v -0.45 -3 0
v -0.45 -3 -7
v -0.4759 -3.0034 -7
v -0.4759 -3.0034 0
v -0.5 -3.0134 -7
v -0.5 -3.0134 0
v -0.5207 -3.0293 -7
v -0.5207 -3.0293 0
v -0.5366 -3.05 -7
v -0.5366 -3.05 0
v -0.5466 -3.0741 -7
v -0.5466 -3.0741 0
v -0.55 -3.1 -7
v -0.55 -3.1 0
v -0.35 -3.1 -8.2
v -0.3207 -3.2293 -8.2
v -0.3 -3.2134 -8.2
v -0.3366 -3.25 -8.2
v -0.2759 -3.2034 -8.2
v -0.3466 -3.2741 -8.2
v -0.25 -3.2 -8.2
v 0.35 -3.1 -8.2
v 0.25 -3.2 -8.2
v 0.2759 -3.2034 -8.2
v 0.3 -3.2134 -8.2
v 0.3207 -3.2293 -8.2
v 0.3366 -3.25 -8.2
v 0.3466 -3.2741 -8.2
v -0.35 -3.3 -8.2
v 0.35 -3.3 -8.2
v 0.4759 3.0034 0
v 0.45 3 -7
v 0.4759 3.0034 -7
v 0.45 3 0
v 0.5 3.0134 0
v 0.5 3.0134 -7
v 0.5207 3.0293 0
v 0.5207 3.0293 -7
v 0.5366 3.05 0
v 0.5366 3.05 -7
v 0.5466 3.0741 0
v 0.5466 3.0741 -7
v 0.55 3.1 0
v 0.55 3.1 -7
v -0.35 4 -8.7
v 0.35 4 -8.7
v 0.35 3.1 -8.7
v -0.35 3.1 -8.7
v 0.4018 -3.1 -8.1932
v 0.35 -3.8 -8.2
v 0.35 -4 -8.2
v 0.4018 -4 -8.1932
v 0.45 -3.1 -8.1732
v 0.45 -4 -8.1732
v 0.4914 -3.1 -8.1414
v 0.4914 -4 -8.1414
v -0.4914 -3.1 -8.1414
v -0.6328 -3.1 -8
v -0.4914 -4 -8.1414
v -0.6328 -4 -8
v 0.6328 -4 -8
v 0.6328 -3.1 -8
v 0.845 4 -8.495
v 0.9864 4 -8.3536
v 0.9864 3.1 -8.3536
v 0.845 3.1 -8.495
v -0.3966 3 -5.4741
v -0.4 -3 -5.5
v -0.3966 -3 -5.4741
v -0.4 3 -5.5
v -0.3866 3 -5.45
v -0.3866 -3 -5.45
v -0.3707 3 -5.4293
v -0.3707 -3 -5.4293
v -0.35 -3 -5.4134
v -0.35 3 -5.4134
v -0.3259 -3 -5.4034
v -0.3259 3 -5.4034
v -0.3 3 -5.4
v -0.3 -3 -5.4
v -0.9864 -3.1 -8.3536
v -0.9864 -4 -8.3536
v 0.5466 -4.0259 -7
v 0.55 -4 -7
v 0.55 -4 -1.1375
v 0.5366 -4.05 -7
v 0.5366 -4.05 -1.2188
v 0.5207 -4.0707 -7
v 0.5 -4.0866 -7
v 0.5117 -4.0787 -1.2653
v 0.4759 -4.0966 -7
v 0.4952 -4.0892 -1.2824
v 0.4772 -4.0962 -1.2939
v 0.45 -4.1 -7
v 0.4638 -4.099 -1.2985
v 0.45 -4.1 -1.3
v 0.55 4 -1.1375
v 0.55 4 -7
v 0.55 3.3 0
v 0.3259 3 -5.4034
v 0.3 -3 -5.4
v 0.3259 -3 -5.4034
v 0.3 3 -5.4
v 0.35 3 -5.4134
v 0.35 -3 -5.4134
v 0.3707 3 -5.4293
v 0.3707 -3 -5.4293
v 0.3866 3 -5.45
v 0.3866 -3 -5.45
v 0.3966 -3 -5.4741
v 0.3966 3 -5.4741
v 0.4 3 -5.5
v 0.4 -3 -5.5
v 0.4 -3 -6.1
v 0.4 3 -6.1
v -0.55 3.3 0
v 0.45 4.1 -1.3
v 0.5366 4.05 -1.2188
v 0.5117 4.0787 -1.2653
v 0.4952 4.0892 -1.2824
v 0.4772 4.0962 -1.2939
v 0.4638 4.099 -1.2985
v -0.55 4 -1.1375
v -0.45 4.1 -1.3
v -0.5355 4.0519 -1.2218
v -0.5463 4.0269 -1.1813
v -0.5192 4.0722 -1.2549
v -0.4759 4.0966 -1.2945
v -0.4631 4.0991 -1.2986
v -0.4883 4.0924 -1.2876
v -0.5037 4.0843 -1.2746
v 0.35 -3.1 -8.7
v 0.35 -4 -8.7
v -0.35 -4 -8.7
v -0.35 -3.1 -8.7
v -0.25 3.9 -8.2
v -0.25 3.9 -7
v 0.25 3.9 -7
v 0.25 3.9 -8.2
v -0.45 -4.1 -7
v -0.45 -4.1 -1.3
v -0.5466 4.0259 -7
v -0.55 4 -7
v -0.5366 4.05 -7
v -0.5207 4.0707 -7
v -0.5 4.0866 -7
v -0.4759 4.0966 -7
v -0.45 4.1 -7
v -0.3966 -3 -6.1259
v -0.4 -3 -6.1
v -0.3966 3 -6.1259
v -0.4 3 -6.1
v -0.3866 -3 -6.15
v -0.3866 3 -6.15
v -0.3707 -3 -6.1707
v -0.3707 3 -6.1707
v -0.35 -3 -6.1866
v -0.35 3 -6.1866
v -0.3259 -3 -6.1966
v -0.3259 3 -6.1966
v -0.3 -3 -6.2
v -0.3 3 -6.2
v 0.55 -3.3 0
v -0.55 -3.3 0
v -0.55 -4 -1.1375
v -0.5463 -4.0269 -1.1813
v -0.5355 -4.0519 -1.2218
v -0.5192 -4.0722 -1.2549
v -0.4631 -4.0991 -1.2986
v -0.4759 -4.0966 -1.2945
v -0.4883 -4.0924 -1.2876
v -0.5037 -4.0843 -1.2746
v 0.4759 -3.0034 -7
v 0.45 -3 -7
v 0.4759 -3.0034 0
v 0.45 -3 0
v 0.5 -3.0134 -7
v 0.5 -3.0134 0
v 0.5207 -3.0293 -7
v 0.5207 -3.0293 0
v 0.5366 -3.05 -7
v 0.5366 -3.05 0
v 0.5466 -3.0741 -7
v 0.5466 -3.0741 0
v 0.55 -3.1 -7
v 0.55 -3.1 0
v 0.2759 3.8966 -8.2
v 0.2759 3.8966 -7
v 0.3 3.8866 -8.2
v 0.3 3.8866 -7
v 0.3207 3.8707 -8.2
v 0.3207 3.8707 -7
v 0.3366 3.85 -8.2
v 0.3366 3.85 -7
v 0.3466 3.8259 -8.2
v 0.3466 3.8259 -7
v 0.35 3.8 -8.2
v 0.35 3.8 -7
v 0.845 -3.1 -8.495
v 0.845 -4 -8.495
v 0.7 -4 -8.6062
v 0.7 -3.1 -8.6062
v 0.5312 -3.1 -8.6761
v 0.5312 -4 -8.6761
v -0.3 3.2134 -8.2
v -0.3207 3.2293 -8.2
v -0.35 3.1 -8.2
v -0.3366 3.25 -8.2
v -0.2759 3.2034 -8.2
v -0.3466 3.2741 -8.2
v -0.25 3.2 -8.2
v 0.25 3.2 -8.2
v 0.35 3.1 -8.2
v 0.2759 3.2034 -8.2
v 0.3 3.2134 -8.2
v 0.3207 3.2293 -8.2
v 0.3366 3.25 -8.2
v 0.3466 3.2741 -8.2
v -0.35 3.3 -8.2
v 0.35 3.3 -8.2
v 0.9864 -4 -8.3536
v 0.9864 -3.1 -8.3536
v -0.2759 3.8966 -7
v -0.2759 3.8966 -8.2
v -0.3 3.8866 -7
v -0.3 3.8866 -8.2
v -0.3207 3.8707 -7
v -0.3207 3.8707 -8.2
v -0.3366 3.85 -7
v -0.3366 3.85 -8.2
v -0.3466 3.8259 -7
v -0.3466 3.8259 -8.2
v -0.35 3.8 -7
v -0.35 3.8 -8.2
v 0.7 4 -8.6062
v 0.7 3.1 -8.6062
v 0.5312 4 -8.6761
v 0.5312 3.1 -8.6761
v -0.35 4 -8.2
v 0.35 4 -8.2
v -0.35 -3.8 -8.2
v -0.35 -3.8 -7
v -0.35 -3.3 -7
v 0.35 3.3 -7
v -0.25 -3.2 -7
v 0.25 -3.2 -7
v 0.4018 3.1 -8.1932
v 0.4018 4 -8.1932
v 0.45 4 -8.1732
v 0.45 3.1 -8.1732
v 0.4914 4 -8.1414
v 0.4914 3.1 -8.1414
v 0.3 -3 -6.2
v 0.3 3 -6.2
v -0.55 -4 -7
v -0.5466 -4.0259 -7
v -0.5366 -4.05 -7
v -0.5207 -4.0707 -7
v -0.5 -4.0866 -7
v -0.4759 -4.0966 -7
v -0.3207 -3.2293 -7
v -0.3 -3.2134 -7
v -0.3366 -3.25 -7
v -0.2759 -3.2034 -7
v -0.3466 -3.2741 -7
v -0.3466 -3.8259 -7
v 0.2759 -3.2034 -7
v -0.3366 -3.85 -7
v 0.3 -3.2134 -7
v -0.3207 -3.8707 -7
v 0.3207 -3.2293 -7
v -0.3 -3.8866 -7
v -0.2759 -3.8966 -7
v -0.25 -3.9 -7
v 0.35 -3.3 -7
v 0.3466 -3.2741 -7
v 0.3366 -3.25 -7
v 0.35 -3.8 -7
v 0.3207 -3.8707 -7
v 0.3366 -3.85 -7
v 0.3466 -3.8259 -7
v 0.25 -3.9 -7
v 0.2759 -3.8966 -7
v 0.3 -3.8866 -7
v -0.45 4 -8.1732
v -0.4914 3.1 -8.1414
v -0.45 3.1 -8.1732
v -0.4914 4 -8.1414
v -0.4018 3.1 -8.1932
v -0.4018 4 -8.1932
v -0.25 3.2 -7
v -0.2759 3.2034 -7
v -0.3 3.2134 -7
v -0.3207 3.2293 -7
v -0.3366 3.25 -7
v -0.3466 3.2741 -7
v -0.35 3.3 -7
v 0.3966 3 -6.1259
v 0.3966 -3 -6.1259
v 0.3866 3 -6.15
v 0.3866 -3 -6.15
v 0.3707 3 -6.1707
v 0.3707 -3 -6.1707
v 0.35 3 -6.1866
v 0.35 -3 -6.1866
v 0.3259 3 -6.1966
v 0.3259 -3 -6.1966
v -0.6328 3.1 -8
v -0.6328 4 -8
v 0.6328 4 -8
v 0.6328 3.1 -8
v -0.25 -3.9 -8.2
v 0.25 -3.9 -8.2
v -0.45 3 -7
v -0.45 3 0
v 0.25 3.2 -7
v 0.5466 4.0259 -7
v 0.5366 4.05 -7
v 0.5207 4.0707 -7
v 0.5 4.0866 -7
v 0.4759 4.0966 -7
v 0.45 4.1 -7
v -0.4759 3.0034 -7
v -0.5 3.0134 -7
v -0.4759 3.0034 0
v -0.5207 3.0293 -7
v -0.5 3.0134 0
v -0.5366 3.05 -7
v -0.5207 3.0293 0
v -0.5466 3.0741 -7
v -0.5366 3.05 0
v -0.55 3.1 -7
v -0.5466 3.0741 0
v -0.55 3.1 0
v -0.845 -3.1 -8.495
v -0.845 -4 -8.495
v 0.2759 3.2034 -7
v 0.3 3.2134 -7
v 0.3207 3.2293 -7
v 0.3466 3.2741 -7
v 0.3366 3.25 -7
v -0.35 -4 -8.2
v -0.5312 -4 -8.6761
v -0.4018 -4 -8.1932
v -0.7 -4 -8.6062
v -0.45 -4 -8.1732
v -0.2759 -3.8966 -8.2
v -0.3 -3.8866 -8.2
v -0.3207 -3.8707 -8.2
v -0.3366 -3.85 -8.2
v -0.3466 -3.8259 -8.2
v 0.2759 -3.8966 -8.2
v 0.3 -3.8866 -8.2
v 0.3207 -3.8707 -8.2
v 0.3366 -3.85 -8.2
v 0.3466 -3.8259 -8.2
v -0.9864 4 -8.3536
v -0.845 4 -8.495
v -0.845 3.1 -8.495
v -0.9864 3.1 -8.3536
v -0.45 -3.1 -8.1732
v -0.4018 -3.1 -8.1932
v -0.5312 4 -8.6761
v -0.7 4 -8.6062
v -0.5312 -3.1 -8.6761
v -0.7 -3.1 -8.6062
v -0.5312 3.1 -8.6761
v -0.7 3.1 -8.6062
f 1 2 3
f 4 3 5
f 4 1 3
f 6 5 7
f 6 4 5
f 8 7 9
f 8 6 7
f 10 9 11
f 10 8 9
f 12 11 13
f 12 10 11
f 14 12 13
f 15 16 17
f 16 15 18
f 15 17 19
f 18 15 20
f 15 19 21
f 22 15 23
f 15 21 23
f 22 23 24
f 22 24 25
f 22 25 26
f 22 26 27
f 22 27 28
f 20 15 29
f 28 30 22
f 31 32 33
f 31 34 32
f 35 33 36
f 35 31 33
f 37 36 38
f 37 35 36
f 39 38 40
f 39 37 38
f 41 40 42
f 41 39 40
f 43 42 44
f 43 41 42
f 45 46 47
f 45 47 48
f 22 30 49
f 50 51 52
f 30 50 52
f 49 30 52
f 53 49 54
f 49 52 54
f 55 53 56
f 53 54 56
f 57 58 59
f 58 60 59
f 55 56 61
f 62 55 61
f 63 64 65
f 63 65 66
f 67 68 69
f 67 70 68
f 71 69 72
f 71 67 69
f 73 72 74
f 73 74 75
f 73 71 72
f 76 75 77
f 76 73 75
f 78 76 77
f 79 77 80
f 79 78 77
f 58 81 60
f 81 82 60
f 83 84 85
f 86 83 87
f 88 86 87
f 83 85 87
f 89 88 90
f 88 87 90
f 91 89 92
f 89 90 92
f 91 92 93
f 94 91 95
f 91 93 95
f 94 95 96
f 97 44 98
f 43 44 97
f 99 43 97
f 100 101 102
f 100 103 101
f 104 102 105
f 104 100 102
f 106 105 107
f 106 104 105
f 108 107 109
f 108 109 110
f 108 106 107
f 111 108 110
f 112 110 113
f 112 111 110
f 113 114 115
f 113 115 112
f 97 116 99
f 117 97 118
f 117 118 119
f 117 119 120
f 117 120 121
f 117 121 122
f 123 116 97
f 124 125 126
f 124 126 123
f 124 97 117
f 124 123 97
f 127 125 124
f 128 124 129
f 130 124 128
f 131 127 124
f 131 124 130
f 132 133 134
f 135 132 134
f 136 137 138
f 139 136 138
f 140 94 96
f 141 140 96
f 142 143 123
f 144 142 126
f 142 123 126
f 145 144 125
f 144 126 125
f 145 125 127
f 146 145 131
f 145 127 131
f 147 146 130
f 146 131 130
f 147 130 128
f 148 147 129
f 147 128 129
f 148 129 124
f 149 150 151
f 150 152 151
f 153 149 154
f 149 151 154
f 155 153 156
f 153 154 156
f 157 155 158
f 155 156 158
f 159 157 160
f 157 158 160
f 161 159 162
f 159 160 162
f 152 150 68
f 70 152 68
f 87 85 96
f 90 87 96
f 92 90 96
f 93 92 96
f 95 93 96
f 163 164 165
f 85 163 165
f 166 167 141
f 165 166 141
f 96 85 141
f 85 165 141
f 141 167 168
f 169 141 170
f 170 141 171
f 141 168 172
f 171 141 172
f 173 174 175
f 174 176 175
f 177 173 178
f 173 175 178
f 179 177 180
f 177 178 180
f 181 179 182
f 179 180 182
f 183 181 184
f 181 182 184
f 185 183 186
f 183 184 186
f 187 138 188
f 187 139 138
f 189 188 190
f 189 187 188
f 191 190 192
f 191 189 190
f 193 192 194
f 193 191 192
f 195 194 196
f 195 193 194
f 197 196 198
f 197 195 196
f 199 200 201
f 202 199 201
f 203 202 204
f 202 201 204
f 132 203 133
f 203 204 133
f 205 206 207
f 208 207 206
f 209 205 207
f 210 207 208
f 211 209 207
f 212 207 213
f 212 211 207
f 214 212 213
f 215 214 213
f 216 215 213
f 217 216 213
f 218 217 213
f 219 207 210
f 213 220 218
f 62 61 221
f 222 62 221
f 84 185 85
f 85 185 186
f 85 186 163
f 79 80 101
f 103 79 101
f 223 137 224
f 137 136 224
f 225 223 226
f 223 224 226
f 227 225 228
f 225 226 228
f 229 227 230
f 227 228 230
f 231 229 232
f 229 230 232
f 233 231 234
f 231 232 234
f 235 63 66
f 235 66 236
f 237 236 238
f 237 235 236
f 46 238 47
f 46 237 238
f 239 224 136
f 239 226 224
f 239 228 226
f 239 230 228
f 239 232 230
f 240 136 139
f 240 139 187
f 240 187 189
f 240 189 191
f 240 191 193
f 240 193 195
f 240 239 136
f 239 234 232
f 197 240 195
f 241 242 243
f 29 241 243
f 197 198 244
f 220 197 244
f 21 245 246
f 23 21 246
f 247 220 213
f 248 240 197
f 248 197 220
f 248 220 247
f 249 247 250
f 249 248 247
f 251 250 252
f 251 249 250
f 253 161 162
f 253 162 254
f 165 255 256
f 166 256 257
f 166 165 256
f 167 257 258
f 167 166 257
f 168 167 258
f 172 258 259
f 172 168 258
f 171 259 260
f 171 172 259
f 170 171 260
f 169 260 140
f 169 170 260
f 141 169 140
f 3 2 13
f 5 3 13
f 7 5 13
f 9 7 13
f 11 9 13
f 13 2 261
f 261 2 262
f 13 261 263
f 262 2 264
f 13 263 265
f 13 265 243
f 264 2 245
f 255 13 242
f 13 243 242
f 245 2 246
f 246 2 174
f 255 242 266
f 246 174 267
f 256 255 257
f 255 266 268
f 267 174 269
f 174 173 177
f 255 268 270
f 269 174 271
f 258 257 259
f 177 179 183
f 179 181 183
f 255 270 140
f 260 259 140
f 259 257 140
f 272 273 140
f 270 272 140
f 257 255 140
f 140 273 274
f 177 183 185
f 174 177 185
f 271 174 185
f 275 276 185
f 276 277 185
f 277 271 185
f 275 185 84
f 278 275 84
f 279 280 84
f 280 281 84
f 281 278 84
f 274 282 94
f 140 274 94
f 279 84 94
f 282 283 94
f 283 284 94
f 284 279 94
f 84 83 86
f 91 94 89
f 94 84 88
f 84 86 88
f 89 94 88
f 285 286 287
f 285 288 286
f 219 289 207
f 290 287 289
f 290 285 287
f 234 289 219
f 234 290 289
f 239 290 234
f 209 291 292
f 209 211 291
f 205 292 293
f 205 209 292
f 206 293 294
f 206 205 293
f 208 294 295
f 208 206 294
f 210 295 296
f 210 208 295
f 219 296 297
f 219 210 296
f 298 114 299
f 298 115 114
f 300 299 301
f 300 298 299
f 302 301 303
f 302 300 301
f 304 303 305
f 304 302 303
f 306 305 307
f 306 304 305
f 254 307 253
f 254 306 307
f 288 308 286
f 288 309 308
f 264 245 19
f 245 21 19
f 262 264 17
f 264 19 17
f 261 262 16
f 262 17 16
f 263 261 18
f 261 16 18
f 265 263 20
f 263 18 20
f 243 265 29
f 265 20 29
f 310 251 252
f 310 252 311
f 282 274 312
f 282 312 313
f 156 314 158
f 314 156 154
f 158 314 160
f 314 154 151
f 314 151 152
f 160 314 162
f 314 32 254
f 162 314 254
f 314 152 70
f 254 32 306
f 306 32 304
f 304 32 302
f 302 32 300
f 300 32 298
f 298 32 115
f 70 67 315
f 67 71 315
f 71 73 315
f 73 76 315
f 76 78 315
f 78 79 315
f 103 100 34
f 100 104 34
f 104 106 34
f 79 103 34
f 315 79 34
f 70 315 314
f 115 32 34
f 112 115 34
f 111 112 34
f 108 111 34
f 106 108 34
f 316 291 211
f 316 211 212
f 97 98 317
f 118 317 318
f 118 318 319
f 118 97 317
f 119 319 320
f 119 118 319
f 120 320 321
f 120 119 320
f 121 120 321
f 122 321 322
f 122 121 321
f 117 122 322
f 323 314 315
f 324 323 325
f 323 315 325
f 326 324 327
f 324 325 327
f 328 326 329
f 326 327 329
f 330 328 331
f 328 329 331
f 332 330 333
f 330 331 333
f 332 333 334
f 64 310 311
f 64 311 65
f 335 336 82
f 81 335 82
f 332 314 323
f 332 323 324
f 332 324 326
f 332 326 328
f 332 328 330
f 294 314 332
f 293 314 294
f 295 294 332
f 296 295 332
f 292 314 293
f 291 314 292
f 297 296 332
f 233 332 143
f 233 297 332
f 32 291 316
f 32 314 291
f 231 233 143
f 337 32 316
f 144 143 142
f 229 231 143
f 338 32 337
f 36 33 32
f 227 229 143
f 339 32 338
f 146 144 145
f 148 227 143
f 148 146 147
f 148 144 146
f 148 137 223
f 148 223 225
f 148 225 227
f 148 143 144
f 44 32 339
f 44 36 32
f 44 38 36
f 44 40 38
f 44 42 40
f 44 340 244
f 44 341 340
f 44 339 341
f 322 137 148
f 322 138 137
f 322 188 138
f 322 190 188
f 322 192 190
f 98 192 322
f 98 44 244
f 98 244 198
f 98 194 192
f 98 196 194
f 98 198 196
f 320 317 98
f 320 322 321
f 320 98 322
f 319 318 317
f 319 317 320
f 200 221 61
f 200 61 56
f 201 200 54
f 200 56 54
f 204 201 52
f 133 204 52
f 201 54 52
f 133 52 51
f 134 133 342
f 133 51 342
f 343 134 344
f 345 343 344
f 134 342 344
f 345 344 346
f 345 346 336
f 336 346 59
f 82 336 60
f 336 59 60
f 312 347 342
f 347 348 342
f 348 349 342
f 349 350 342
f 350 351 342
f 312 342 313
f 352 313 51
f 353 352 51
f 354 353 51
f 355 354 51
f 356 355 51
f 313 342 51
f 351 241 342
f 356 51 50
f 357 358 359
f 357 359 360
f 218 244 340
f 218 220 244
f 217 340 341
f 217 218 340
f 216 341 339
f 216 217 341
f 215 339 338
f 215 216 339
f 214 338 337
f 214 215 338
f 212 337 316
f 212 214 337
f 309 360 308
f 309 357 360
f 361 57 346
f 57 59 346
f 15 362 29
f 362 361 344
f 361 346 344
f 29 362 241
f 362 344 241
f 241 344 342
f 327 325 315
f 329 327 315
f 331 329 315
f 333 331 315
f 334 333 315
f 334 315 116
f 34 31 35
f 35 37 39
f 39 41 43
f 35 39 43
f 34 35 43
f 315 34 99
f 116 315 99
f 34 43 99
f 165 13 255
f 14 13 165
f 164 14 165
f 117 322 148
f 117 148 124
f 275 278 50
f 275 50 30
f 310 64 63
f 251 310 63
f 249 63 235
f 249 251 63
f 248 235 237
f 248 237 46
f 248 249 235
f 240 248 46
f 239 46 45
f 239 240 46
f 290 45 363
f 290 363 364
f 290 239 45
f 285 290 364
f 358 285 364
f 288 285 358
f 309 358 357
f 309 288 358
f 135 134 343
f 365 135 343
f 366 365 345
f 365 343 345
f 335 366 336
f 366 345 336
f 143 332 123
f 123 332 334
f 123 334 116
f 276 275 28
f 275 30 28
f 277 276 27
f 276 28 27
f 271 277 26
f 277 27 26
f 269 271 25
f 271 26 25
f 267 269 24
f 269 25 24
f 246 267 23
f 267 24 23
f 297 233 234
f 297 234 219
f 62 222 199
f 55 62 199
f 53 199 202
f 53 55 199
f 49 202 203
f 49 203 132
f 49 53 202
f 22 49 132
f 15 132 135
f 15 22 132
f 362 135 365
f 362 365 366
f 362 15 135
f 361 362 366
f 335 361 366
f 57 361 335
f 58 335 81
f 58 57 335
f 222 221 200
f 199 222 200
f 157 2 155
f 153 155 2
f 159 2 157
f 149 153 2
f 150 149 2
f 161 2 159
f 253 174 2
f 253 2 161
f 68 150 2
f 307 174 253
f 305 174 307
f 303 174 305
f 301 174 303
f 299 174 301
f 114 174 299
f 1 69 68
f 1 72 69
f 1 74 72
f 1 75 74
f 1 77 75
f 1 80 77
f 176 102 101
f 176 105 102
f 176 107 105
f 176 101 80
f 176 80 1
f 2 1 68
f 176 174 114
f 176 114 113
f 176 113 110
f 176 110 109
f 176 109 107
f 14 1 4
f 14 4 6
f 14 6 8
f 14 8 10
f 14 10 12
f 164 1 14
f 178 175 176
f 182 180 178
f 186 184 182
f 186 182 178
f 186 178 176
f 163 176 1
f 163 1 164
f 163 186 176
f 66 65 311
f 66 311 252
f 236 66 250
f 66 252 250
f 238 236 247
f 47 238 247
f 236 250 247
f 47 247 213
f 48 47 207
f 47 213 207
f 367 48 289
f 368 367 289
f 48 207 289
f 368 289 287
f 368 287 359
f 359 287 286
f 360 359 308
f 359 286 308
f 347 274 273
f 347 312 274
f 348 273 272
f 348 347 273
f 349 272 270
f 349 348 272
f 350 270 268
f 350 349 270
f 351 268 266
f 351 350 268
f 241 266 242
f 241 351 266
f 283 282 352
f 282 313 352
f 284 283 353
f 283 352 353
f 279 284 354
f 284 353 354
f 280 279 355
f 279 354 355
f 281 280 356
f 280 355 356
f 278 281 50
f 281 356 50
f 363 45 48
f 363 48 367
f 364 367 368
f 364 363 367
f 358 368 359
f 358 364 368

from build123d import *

# Parameters (mm, degrees)
F0_W         = 1.1
F0_H         = 7
F1_DEPTH     = 0.55
F2_W         = 0.7
F2_H         = 0.7
F3_DEPTH     = 1.2
F4_R         = 0.1
F7_DEPTH     = 0.45
F8_W         = 0.8
F8_H         = 0.8
F9_DEPTH     = 3
F10_R        = 0.1
F11_T1_DEPTH = 7.6228122918


# Not quite as in the source:
# - a fillet or chamfer that OpenCascade refuses, or shapes differently, is made with other operations: its cross-section is extruded or revolved along the edge and cut away or added


with BuildPart() as f1:
    # F0 (on Right) → F1 (new body, symmetric)
    with BuildSketch(Plane.YZ):
        with Locations((3.55, -3.5)):
            Rectangle(F0_W, F0_H)
    extrude(amount=F1_DEPTH, both=True)

    # F2 (on face) → F3 (join)
    with BuildSketch(Plane(origin=(0, 0, -7), x_dir=(1, 0, 0), z_dir=(0, 0, -1))):
        with Locations((0, -3.55)):
            Rectangle(F2_W, F2_H)
    extrude(amount=F3_DEPTH)

    # F4
    f4_edges = [f1.edges().sort_by_distance(p)[0] for p in [
        (0.55, 4.1, -3.5),
        (0.55, 3, -3.5),
        (-0.55, 4.1, -3.5),
        (0.35, 3.9, -7.6),
        (-0.35, 3.9, -7.6),
        (0.35, 3.2, -7.6),
        (-0.35, 3.2, -7.6),
        (-0.55, 3, -3.5),
    ]]
    fillet(f4_edges, radius=F4_R)

    # F6 (on mid) → F7 (join, symmetric)
    with BuildSketch(Plane(origin=(0, 3.55, 0), x_dir=(-1, 0, 0), z_dir=(0, 1, 0))):
        with BuildLine():
            ThreePointArc((0.4914213562, -8.1414213562), (0.4265366865, -8.1847759065), (0.35, -8.2))
            Line((0.35, -8.2), (-0.35, -8.2))
            ThreePointArc((-0.35, -8.2), (-0.4265366865, -8.1847759065), (-0.4914213562, -8.1414213562))
            Line((-0.4914213562, -8.1414213562), (-0.6328427125, -8))
            Line((-0.6328427125, -8), (-0.9863961031, -8.3535533906))
            Line((-0.9863961031, -8.3535533906), (-0.8449747468, -8.4949747468))
            ThreePointArc((-0.8449747468, -8.4949747468), (-0.6178784027, -8.6467156728), (-0.35, -8.7))
            Line((-0.35, -8.7), (0.35, -8.7))
            ThreePointArc((0.35, -8.7), (0.6178784027, -8.6467156728), (0.8449747468, -8.4949747468))
            Line((0.8449747468, -8.4949747468), (0.9863961031, -8.3535533906))
            Line((0.9863961031, -8.3535533906), (0.6328427125, -8))
            Line((0.6328427125, -8), (0.4914213562, -8.1414213562))
        make_face()
    extrude(amount=F7_DEPTH, both=True)

    # F8 (on face) → F9 (join, through all)
    with BuildSketch(Plane.XZ.offset(-3)):
        with Locations((0, -5.8)):
            Rectangle(F8_W, F8_H)
    extrude(amount=F9_DEPTH)

    # F10
    f10_edges = [f1.edges().sort_by_distance(p)[0] for p in [
        (-0.4, 1.5, -5.4),
        (-0.4, 1.5, -6.2),
        (0.4, 1.5, -6.2),
        (0.4, 1.5, -5.4),
    ]]
    fillet(f10_edges, radius=F10_R)

    # F11: chamfer of 0.8 x 1.3 on 1 edges, made by hand

    # F11_s2 → F11_t1 (cut)
    with BuildSketch(Plane.YZ.offset(-3.8114061459)):
        Polygon((3.3, 0), (4.1, -1.3), (4.1, 0), align=None)
    extrude(amount=F11_T1_DEPTH, mode=Mode.SUBTRACT)

    # F12: F1 across plane


with BuildPart() as f1_1:
    add(f1.part)
    add(f1.part.mirror(Plane.XZ))


solid = f1_1.part
